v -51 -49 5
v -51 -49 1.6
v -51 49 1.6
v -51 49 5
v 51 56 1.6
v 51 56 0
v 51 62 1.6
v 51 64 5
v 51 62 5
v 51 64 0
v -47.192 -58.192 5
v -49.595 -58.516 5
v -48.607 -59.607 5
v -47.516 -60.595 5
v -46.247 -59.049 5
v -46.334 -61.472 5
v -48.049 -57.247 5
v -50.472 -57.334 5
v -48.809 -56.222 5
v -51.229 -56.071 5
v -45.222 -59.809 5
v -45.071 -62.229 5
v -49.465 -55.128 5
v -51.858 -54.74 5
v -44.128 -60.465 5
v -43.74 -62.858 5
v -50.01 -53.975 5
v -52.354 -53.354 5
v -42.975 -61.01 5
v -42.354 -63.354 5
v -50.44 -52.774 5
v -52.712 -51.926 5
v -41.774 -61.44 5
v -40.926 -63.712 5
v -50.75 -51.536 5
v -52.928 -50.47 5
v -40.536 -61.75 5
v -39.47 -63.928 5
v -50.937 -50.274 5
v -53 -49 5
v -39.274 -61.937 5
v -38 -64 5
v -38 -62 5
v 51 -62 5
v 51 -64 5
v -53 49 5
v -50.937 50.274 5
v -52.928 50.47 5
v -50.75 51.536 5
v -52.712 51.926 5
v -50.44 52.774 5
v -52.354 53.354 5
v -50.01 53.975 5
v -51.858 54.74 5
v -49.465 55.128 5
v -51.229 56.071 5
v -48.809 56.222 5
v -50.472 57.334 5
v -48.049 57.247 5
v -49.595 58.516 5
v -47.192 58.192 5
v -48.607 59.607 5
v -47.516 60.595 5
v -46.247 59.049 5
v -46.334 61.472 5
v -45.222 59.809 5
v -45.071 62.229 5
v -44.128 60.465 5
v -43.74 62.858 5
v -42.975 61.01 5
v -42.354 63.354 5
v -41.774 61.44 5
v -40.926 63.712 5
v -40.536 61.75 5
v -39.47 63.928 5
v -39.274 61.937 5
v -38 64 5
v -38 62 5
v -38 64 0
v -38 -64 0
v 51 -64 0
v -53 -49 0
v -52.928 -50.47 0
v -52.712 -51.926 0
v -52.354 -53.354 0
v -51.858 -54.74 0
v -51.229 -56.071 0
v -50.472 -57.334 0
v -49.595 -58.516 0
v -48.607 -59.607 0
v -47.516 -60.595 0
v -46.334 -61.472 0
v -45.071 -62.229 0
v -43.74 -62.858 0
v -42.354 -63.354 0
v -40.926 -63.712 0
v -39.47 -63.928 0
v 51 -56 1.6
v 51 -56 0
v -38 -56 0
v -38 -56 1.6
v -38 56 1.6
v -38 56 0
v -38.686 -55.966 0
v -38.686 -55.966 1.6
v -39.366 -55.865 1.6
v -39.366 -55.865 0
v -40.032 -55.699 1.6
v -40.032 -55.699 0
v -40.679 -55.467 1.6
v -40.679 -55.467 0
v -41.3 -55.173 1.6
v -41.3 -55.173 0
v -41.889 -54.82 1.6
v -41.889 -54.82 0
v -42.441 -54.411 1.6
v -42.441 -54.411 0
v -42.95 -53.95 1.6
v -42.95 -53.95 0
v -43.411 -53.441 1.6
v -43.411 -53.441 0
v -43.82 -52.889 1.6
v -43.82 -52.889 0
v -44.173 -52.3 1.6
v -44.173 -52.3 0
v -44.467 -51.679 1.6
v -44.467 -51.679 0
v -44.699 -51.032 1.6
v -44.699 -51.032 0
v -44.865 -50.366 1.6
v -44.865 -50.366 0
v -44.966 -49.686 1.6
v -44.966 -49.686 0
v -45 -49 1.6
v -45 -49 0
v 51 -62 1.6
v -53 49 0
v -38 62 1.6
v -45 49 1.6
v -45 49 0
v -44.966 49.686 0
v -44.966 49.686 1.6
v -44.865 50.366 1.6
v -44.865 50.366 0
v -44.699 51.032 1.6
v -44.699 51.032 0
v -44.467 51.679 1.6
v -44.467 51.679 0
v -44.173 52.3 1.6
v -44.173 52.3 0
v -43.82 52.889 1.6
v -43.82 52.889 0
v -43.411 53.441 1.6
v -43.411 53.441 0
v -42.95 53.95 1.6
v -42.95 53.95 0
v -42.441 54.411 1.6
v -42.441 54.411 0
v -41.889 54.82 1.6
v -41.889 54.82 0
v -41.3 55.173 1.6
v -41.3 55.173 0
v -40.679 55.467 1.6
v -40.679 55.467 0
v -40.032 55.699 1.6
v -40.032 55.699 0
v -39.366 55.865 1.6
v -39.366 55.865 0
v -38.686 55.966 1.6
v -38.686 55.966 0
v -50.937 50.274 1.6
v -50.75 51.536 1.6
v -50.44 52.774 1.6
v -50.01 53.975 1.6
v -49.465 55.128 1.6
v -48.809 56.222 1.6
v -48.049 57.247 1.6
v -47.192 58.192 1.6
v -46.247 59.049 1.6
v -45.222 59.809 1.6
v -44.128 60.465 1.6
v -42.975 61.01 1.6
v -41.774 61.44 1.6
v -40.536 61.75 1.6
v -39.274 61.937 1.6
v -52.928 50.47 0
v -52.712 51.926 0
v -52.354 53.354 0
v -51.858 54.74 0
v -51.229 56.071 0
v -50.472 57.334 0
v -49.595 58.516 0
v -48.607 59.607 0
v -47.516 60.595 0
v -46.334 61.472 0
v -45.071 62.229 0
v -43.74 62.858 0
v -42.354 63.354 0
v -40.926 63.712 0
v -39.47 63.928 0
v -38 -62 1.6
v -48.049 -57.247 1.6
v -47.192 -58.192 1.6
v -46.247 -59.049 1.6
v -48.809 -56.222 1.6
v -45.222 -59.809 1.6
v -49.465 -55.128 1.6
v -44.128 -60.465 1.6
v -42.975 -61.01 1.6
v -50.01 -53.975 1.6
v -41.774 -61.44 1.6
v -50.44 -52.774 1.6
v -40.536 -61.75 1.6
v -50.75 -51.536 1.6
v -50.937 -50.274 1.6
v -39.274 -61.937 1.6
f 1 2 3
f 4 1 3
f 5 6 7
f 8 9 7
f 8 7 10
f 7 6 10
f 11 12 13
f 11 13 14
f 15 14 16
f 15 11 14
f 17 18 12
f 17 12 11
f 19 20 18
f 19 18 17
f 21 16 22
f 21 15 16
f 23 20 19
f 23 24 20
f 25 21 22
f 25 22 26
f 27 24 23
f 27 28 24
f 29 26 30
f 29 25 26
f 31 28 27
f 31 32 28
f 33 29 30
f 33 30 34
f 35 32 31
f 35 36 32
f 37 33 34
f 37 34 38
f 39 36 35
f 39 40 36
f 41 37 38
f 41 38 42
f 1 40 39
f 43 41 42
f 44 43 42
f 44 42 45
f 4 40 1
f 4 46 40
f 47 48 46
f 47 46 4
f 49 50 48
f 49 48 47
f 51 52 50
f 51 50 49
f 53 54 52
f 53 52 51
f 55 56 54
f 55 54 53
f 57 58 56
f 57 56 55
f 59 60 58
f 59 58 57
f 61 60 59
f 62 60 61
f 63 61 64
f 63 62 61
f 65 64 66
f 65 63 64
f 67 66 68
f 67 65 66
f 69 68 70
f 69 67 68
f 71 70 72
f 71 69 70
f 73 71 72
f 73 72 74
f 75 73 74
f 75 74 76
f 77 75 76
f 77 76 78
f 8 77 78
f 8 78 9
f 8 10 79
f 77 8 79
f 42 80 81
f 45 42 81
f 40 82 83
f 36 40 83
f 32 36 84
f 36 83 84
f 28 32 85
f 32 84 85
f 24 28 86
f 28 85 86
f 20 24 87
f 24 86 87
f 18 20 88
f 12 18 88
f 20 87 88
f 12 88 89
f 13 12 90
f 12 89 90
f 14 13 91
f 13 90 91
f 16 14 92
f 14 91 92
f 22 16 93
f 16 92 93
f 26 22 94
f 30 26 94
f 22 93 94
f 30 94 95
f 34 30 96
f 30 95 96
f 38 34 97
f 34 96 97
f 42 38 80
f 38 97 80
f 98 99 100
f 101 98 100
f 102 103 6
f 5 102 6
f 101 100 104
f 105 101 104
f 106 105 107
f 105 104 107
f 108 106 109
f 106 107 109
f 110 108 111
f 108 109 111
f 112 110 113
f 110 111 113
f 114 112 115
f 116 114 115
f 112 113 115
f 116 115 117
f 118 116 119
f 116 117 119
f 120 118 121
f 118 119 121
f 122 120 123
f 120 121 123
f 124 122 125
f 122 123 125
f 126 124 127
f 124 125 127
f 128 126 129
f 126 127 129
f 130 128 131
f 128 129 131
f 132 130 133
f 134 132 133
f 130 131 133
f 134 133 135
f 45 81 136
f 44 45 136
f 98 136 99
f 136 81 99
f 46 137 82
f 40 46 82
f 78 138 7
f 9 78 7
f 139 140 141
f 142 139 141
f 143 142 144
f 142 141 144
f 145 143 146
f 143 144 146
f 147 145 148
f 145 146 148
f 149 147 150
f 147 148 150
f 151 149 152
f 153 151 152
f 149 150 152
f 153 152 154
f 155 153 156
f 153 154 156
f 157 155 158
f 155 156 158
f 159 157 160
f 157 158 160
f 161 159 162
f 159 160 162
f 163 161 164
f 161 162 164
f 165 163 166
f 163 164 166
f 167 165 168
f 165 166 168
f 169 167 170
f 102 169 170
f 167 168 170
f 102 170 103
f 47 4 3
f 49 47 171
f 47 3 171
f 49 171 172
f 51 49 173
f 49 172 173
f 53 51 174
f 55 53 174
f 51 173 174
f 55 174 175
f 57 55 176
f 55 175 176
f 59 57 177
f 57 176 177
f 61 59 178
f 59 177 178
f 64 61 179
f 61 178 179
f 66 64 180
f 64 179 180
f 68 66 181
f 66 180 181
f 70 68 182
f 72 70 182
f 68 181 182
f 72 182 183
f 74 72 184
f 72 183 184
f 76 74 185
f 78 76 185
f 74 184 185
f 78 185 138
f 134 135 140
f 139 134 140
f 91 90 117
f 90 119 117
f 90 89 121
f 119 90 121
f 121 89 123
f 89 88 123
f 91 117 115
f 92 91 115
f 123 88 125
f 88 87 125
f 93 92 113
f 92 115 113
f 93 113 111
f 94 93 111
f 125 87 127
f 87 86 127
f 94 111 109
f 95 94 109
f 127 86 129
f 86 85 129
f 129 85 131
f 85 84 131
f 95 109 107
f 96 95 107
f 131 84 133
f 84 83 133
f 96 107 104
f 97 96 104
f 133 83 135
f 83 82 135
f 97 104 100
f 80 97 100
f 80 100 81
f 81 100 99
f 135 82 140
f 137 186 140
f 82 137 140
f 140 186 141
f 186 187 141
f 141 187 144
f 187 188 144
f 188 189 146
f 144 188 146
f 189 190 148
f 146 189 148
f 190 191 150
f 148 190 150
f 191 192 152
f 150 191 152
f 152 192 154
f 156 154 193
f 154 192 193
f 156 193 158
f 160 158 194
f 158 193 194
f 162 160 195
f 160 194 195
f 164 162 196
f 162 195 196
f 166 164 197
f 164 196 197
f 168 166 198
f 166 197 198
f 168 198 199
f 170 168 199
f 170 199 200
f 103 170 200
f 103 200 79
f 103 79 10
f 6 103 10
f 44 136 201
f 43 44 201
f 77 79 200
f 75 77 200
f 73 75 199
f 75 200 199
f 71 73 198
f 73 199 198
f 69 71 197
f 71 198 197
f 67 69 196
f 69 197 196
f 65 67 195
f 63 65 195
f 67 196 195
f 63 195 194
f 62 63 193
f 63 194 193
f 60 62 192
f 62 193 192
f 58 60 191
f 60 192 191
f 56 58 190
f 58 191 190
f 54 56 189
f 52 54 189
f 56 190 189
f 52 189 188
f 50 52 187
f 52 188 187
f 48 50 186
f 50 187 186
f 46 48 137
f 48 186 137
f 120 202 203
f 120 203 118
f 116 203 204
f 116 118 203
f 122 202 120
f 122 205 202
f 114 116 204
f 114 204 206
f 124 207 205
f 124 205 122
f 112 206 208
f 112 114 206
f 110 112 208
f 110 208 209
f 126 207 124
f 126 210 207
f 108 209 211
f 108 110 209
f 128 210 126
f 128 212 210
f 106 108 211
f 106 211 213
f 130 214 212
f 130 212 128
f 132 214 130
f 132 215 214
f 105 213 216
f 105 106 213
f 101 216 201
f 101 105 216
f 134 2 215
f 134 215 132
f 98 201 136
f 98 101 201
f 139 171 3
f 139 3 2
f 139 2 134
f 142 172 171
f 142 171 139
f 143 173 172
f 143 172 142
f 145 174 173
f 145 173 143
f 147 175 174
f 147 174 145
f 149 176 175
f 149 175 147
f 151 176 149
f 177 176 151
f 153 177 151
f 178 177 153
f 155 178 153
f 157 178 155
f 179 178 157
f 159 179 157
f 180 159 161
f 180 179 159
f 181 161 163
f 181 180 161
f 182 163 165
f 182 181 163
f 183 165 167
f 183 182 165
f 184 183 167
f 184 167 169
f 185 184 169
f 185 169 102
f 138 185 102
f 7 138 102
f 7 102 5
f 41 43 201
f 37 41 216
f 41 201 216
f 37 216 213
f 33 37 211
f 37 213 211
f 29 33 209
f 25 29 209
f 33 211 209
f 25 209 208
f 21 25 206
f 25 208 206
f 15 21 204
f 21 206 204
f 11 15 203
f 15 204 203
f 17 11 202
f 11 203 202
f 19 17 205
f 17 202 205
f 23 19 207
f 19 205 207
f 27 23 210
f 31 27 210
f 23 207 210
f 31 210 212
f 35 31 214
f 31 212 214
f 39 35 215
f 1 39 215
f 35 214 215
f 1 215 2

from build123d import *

# Parameters (mm, degrees)
F1_DEPTH = 1.6
F2_DEPTH = 5


with BuildPart() as f1:
    # F0 (on Top) → F1 (new body)
    with BuildSketch(Plane.XY):
        with BuildLine():
            Line((51, 62), (-38, 62))
            ThreePointArc((-38, 62), (-47.192388, 58.192388), (-51, 49))
            Line((-51, 49), (-51, -49))
            ThreePointArc((-51, -49), (-47.192388, -58.192388), (-38, -62))
            Line((-38, -62), (51, -62))
            Line((51, -62), (51, -56))
            Line((51, -56), (-38, -56))
            ThreePointArc((-38, -56), (-42.949747, -53.949747), (-45, -49))
            Line((-45, -49), (-45, 49))
            ThreePointArc((-45, 49), (-42.949747, 53.949747), (-38, 56))
            Line((-38, 56), (51, 56))
            Line((51, 56), (51, 62))
        make_face()
    extrude(amount=F1_DEPTH)

    # F0 (on Top) → F2 (join)
    with BuildSketch(Plane.XY):
        with BuildLine():
            ThreePointArc((-51, 49), (-47.192388, 58.192388), (-38, 62))
            Line((-38, 62), (51, 62))
            Line((51, 62), (51, 64))
            Line((51, 64), (-38, 64))
            ThreePointArc((-38, 64), (-48.606602, 59.606602), (-53, 49))
            Line((-53, 49), (-53, -49))
            ThreePointArc((-53, -49), (-48.606602, -59.606602), (-38, -64))
            Line((-38, -64), (51, -64))
            Line((51, -64), (51, -62))
            Line((51, -62), (-38, -62))
            ThreePointArc((-38, -62), (-47.192388, -58.192388), (-51, -49))
            Line((-51, -49), (-51, 49))
        make_face()
    extrude(amount=F2_DEPTH)


solid = f1.part
